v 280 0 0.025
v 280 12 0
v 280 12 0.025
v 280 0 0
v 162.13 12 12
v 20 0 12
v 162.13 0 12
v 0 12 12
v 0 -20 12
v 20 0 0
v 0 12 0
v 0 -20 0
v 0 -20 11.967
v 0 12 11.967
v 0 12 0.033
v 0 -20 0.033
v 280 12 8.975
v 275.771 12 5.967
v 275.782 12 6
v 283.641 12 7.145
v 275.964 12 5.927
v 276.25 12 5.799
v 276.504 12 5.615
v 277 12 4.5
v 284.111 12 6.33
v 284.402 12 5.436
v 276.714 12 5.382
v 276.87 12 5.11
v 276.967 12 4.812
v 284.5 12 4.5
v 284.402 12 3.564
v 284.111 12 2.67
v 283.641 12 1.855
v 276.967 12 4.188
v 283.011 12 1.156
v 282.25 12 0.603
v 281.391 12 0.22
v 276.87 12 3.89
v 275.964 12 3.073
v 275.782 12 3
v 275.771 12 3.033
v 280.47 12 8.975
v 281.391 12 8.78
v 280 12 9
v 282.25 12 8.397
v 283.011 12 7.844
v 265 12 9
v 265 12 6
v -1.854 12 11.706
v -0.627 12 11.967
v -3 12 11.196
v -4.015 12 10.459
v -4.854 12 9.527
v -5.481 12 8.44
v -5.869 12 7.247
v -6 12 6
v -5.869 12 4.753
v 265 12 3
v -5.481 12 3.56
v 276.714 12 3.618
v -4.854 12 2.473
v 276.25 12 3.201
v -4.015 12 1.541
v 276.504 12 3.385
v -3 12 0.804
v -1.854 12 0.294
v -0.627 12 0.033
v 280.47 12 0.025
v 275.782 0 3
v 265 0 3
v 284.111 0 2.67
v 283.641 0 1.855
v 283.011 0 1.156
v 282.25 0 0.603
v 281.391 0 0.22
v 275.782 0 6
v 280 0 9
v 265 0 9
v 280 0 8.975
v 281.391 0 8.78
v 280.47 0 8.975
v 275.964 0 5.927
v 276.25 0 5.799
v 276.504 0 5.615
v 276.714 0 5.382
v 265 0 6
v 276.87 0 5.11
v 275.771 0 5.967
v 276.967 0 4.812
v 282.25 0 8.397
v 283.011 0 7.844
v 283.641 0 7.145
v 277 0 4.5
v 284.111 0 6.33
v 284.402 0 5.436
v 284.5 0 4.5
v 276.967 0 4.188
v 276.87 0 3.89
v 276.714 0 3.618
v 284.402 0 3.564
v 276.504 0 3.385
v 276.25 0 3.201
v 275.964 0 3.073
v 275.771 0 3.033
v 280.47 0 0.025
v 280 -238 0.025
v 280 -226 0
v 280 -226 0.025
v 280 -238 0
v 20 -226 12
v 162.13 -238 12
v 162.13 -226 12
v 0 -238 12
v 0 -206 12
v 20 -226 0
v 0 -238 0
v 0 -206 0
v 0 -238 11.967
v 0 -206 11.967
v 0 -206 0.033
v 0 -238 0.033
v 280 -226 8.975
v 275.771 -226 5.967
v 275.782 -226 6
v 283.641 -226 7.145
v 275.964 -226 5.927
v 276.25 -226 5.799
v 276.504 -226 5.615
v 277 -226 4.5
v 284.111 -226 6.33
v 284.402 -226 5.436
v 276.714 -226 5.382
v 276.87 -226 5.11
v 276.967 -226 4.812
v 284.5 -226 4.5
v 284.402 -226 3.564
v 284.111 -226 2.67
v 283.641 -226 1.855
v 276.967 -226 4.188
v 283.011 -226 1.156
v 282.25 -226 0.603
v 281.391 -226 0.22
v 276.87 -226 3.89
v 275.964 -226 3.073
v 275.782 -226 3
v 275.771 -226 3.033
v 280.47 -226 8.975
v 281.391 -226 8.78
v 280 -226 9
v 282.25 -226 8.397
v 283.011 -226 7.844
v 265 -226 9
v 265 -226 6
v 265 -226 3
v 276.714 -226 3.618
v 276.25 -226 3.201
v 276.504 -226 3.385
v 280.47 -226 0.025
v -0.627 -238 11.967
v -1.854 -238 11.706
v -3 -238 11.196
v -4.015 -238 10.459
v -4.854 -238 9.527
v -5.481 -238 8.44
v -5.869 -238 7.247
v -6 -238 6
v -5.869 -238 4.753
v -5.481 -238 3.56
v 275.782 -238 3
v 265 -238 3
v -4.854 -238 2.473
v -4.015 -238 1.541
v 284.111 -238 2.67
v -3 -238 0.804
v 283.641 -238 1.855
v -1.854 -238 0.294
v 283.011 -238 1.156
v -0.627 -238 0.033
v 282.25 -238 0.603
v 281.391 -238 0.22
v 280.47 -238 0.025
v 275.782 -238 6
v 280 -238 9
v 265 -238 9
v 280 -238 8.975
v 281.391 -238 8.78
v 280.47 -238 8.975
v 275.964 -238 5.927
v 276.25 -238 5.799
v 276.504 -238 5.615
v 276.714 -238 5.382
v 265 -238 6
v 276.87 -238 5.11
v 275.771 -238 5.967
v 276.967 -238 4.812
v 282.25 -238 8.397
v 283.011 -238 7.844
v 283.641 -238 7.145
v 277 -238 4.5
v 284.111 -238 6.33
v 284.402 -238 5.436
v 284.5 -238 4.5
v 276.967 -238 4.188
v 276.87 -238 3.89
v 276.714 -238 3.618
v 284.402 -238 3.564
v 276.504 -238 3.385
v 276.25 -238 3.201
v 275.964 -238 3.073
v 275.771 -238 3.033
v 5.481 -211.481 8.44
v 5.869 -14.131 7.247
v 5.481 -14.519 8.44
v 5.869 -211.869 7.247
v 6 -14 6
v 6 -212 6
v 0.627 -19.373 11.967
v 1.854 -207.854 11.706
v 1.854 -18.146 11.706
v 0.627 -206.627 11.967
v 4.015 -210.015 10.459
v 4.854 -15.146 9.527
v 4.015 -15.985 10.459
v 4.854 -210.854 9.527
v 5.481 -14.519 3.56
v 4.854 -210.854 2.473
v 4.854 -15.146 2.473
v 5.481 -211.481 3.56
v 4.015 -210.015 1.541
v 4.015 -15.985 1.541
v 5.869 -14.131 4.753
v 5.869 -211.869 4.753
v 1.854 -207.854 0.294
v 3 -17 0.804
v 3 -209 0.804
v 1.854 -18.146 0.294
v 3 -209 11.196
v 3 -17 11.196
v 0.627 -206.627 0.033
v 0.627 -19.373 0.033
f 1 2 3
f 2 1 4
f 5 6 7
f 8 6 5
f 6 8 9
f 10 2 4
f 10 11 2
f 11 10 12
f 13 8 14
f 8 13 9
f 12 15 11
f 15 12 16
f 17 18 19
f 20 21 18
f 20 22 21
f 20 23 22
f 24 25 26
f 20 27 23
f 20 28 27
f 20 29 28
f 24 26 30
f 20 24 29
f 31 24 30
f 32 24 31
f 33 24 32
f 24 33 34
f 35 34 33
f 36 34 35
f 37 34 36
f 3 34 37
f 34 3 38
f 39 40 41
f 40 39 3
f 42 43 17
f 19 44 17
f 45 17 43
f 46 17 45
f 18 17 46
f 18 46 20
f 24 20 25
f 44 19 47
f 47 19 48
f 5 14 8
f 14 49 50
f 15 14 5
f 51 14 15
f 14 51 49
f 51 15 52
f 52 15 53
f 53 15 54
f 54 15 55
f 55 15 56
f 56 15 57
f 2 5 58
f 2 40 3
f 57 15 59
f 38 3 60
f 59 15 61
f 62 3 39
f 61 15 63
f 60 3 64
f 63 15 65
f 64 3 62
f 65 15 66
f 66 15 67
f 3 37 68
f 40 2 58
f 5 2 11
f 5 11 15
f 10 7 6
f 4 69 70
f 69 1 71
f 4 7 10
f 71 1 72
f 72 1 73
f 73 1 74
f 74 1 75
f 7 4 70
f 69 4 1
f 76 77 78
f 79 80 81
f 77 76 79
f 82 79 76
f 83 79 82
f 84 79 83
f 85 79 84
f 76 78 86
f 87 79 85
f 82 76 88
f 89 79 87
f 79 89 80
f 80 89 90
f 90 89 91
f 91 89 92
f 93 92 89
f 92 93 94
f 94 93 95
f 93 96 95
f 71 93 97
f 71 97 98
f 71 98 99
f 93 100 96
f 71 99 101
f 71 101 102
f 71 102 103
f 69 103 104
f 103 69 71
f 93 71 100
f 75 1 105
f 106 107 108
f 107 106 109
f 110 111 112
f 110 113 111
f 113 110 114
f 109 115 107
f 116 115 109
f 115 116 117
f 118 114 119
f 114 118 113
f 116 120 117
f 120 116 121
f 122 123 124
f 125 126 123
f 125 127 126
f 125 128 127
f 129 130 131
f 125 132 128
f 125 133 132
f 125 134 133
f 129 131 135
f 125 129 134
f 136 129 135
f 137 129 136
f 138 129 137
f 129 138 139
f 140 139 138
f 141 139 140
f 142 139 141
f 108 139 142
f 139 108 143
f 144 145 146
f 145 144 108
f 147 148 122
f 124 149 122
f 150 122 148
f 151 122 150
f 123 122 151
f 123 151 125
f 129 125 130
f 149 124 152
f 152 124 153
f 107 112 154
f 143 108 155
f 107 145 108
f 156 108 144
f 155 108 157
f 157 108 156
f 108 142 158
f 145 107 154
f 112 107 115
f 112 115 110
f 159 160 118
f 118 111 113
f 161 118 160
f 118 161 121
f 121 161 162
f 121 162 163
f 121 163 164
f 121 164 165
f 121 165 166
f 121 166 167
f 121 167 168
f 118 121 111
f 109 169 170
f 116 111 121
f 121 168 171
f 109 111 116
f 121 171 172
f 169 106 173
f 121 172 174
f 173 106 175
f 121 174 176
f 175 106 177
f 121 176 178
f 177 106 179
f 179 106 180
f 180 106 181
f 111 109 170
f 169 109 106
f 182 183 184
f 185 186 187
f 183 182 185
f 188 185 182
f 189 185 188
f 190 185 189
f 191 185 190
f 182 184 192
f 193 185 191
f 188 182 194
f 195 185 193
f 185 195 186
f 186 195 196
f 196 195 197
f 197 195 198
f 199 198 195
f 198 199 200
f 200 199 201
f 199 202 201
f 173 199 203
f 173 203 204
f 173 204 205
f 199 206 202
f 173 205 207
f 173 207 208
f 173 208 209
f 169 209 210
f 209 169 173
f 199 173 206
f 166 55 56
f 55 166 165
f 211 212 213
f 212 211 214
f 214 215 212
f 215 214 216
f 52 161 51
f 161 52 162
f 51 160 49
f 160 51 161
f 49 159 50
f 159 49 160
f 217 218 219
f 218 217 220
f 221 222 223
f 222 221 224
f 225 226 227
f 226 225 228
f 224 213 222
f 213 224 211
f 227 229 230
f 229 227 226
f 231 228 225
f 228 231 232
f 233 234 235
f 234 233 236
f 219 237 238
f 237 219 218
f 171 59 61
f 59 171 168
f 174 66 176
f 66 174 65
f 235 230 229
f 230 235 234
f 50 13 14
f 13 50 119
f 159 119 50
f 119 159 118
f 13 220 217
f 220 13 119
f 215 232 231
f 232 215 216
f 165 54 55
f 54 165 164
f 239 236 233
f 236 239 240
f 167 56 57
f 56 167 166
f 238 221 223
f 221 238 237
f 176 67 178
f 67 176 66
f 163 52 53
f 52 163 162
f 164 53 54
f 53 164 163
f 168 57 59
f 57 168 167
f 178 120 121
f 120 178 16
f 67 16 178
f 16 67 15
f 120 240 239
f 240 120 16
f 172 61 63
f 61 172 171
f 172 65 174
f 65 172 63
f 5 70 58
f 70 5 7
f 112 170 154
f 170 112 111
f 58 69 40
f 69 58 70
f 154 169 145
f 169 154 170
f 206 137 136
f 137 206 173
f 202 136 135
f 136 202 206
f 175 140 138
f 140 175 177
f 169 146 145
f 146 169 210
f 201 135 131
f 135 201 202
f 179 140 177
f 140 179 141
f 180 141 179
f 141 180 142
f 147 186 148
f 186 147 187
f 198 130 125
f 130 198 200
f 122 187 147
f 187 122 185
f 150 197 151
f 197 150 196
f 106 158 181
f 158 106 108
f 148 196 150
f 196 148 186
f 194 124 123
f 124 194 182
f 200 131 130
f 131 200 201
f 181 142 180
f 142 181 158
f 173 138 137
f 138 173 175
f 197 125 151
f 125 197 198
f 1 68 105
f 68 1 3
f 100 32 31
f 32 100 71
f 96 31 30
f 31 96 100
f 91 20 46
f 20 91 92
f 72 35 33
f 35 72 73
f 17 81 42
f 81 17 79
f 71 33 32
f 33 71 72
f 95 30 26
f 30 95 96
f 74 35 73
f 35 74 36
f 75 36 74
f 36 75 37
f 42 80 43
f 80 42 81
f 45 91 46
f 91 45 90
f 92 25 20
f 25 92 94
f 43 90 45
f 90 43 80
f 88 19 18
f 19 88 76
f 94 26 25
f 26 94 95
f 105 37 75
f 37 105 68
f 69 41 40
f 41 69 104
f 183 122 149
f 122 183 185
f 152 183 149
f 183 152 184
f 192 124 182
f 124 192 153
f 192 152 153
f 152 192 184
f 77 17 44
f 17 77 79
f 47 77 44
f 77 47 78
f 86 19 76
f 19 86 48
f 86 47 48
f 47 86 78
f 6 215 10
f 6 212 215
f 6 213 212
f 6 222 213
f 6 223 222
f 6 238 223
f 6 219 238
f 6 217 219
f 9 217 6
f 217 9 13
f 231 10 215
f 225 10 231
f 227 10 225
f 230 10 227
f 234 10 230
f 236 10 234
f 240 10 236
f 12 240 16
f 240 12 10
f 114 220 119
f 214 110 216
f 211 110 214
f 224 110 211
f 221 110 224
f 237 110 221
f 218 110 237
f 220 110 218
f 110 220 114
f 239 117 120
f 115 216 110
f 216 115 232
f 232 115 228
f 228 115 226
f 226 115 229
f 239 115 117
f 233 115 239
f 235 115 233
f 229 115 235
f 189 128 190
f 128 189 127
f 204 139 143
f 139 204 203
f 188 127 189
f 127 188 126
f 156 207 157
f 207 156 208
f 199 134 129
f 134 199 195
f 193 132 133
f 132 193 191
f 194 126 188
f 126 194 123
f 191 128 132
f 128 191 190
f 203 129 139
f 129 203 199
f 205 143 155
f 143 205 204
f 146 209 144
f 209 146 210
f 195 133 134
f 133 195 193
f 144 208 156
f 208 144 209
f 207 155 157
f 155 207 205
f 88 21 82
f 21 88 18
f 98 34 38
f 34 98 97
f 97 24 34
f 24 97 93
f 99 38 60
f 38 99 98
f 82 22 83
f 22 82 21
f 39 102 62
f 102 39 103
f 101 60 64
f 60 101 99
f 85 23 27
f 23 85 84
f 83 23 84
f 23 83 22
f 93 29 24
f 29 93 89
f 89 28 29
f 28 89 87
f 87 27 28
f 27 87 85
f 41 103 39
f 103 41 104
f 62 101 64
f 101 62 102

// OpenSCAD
//length

l = 280;

//width

w = 250;

//thickness

s = 12;


//hook thickness

hw = 9;
hl = 15;

//strengthen width
sw = 20;

$fn = 30;


difference(){

union(){


//hook outer

translate([l,-w+s,hw/2]) rotate([-90,0,0])cylinder(s,hw/2,hw/2);

translate([l,0,hw/2]) rotate([-90,0,0])cylinder(s,hw/2,hw/2);

translate([l-hl,-w+s,hw*2/3]) cube([hl,s,hw/3]);
translate([l-hl,0,hw*2/3]) cube([hl,s,hw/3]);


//strengthen 
linear_extrude(s) polygon([[0,0],[0,-sw],[sw,0]]);
translate([0,-w+2*s,0])linear_extrude(s) polygon([[0,0],[0,sw],[sw,0]]);


difference(){

union(){


//holders

cube([l,s,s]);

translate([0,-w+s,0])cube([l,s,s]);


//sitting rod

translate([0,s,s/2])rotate([90,0,0])cylinder(w,s/2,s/2);


}


//make the holder flat on the upside

translate([l-hl,-w,hw/3]) rotate([0,-85,0]) cube([10000,10000,10000]);
translate([l-hl,-w,hw/3]) cube([10000,10000,10000]);

}


}


translate([l-hw/2,-w+s,hw/2]) rotate([-90,0,0])cylinder(s,hw/6,hw/6);

translate([l-hw/2,0,hw/2]) rotate([-90,0,0])cylinder(s,hw/6,hw/6);


}
